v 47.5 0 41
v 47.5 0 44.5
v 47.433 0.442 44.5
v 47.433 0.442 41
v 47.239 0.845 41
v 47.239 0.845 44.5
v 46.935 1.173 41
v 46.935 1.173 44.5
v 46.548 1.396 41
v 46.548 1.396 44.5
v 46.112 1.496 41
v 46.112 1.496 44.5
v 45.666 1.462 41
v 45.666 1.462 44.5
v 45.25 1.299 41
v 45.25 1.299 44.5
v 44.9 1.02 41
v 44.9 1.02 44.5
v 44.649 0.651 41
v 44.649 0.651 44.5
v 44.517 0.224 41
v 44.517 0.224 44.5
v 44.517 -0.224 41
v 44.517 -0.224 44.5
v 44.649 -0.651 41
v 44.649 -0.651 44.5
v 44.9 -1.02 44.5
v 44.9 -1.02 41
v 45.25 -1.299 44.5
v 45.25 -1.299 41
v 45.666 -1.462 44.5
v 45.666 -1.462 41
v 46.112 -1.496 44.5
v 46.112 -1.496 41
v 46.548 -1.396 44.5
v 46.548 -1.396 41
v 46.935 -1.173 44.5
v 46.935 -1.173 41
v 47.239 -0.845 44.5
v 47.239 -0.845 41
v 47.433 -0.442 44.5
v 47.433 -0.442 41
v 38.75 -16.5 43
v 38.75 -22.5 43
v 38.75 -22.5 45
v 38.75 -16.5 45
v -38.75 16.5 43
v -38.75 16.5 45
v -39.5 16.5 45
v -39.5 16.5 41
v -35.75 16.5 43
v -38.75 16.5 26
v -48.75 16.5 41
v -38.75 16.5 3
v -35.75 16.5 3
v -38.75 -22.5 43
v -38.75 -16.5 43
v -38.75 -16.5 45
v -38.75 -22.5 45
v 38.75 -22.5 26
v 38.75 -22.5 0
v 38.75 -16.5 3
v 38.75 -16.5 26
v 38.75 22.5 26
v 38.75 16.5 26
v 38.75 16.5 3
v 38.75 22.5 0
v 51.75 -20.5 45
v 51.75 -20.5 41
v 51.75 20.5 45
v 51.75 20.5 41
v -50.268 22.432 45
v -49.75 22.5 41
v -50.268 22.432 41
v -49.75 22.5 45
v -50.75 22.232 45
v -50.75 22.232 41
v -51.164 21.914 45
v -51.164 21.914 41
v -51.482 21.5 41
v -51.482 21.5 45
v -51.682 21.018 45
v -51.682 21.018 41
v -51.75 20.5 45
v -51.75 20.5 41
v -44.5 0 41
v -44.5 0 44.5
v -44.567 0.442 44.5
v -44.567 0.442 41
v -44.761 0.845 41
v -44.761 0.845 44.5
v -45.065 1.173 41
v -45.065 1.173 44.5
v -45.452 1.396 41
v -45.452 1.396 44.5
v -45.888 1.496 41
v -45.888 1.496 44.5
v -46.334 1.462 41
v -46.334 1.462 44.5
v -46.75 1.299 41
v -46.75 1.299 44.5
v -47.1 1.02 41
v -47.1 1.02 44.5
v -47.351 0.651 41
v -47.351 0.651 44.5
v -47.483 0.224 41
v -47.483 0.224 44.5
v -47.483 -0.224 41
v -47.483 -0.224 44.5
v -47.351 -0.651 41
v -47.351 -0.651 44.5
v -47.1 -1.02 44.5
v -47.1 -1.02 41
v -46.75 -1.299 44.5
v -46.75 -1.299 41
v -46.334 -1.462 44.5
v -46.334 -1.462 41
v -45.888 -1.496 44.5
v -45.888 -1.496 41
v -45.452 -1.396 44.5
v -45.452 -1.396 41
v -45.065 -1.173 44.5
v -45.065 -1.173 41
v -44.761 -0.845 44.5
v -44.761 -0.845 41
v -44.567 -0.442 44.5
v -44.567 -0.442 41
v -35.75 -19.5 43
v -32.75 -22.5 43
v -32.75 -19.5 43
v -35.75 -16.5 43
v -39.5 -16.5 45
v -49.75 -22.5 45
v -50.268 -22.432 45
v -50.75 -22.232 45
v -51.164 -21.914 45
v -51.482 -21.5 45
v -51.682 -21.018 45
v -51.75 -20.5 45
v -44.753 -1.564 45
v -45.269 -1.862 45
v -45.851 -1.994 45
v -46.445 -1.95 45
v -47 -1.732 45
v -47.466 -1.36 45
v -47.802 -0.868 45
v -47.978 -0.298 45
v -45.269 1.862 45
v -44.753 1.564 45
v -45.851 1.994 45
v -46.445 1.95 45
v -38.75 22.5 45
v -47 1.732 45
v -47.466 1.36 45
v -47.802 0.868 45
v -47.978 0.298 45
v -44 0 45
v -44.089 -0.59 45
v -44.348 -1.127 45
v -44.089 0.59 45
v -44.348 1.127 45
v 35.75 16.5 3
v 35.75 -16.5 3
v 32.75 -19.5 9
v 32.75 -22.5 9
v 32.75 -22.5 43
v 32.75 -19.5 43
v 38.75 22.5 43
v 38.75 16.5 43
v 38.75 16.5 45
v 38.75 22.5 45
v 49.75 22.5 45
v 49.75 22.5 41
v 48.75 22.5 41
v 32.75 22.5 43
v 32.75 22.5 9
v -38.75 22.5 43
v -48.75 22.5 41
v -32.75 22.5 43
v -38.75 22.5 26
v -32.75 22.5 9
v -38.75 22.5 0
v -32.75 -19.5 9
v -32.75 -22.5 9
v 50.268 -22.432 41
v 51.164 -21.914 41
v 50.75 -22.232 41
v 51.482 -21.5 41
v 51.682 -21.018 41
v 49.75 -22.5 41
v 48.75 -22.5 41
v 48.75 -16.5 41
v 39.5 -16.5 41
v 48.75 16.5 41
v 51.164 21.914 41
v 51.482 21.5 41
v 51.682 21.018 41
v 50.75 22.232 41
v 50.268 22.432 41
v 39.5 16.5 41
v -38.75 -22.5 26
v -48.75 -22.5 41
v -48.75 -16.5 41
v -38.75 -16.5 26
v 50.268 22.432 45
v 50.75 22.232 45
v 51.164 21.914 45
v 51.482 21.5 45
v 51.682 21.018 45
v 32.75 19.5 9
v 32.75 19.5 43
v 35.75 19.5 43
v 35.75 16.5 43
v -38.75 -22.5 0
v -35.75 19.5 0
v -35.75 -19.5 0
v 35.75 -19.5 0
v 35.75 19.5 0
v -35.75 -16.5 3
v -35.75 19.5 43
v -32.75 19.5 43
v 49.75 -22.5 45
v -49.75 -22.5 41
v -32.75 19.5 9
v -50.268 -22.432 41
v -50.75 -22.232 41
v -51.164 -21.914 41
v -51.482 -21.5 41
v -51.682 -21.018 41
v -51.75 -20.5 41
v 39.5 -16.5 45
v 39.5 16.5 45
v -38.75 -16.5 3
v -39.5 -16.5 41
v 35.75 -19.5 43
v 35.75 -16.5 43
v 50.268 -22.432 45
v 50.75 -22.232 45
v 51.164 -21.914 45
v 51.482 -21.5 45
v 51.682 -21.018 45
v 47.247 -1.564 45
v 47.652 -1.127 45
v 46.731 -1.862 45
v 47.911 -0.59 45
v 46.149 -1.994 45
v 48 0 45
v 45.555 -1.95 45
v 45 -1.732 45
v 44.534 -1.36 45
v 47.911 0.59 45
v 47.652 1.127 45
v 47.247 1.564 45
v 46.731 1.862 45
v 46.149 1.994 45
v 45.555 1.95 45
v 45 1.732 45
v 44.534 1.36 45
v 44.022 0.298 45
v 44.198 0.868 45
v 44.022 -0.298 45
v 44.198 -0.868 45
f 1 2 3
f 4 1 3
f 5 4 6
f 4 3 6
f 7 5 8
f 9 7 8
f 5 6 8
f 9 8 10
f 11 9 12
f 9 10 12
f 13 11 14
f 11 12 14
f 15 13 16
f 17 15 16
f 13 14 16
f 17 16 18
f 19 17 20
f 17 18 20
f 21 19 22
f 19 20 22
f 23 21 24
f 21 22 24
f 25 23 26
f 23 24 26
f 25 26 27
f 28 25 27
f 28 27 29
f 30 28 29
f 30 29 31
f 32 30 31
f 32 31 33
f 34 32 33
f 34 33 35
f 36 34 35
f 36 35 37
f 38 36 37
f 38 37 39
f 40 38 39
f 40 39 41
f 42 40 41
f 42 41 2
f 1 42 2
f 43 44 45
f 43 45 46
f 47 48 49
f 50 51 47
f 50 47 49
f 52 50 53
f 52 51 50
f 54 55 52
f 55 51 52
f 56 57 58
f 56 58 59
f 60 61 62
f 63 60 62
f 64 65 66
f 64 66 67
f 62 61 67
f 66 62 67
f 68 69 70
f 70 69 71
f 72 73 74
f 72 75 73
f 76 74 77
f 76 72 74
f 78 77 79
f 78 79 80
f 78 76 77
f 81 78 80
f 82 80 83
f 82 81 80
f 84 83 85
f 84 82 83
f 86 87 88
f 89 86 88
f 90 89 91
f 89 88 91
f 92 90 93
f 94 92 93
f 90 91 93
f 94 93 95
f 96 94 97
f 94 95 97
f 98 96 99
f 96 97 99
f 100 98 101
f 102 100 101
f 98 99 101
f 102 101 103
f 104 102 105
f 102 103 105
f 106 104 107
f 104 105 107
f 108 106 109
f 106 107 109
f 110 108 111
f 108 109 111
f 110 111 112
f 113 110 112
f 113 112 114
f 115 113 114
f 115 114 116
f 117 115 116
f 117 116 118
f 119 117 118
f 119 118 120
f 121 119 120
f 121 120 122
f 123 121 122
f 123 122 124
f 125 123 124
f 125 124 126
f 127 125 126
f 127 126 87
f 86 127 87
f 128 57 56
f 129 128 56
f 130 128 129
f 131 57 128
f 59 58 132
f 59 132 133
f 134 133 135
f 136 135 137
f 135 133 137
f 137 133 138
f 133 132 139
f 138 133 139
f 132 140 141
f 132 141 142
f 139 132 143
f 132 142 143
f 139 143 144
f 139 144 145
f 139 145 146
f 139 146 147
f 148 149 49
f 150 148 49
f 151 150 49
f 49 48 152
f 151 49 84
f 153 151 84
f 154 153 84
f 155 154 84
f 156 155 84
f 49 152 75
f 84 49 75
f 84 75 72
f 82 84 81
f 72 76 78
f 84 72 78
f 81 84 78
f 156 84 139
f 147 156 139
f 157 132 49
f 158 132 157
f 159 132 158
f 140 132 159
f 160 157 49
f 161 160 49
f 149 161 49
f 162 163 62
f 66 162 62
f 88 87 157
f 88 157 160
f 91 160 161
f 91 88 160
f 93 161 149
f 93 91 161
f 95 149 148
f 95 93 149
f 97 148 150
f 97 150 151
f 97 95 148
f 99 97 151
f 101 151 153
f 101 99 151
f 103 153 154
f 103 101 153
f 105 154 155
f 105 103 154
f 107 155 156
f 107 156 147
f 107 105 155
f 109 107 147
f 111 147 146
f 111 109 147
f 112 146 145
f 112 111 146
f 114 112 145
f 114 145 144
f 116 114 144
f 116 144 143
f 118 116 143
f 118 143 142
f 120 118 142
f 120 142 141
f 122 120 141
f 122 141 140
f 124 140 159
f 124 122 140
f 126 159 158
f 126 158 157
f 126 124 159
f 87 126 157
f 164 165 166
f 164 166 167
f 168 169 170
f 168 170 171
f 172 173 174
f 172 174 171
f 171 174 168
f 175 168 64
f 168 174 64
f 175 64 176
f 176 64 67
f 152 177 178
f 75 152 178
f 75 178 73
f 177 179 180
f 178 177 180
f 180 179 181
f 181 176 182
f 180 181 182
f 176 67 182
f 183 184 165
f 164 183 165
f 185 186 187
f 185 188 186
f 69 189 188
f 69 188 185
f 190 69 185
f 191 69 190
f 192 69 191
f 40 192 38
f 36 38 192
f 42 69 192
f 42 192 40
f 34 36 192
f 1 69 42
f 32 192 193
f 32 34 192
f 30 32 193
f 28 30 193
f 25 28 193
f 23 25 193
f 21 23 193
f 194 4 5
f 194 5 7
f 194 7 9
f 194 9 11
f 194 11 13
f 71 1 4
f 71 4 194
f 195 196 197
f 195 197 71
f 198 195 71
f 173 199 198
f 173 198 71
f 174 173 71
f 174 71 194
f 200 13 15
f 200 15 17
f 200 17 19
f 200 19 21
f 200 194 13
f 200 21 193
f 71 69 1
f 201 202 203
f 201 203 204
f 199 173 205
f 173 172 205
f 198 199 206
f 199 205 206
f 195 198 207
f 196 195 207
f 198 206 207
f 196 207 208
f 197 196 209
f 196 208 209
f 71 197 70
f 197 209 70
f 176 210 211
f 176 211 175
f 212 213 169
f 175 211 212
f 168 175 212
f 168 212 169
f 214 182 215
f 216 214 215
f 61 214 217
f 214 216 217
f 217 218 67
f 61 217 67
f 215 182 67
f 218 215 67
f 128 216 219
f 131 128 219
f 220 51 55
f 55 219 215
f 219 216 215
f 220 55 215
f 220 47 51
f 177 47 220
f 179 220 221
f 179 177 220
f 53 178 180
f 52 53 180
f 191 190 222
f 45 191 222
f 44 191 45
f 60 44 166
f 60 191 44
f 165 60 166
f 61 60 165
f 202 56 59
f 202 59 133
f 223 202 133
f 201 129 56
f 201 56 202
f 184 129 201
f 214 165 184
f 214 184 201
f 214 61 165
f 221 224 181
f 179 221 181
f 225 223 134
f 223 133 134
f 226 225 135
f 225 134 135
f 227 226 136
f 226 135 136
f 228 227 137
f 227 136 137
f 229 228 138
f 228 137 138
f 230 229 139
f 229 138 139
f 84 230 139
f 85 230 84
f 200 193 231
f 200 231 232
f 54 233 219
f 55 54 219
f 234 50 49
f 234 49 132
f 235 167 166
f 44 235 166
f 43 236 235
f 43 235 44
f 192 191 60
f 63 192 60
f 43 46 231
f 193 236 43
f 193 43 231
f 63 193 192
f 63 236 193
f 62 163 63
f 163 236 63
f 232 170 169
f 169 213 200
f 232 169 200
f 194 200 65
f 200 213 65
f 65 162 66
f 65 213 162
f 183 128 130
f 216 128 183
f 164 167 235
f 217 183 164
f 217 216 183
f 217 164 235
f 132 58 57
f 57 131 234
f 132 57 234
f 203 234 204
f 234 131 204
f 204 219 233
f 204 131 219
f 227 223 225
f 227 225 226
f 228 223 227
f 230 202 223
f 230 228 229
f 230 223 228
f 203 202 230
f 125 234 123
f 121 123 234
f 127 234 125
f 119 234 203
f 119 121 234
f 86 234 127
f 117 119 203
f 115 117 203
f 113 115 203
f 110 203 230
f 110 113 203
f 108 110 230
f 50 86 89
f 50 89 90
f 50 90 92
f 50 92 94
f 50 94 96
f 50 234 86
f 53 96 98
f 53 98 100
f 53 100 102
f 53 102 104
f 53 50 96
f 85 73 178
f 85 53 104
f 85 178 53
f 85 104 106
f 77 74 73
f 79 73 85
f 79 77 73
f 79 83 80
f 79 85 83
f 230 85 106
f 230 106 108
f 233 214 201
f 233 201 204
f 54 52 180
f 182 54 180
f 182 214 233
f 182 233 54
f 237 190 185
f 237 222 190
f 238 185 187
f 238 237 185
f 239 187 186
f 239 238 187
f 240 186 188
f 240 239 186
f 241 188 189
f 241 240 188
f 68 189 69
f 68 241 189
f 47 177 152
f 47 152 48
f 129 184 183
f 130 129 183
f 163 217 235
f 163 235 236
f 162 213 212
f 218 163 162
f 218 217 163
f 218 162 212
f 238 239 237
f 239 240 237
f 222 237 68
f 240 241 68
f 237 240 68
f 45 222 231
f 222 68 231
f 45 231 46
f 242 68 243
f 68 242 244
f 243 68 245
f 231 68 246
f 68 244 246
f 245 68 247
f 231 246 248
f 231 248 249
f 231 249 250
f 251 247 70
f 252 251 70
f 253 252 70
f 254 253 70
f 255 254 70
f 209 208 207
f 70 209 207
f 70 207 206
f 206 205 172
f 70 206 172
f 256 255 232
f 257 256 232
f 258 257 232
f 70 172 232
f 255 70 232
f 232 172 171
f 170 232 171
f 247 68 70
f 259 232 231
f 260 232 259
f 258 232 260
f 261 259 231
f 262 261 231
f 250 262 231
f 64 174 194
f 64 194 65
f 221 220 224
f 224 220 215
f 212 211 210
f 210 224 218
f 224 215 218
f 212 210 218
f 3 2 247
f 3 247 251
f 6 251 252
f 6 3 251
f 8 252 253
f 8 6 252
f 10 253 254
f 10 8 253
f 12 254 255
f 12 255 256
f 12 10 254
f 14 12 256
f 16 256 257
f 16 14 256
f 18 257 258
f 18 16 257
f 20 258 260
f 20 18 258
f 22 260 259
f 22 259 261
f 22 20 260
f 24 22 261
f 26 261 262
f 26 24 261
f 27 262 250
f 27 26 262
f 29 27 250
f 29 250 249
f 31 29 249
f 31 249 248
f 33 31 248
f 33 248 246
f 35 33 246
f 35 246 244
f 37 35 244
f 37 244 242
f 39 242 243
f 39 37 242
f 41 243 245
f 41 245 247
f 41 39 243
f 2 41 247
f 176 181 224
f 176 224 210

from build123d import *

# Parameters (mm, degrees)
SKETCH_1_W             = 77.5
SKETCH_1_H             = 45
SKETCH_1_W_2           = 71.5
SKETCH_1_H_2           = 39
EXTRUDE_1_DEPTH        = 3
SKETCH_2_W             = 3
SKETCH_2_H             = 3
EXTRUDE_2_DEPTH        = 40
SKETCH_3_W             = 3
SKETCH_3_H             = 3
EXTRUDE_3_DEPTH        = 40
EXTRUDE_4_DEPTH        = 2
EXTRUDE_4_DEPTH_BACK   = 2
EXTRUDE_4_2_DEPTH      = 2
EXTRUDE_4_2_DEPTH_BACK = 2
SKETCH_5_W             = 65.5
SKETCH_5_H             = 6
EXTRUDE_5_DEPTH        = 3
SKETCH_6_W             = 65.5
SKETCH_6_H             = 6
EXTRUDE_6_DEPTH        = 3
SKETCH_7_R             = 1.5
CUT_EXTRUDE_1_DEPTH    = 5
CHAMFER_1_SIZE         = 0.5
CHAMFER_2_SIZE         = 0.5
CHAMFER_3_SIZE         = 2
CHAMFER_4_SIZE         = 2
EXTRUDE_7_DEPTH        = 6
MIRROR_2_COPY_1_DEPTH  = 6
MIRROR_2_COPY_2_DEPTH  = 6
SKETCH_9_W             = 2
SKETCH_9_H             = 45
CUT_EXTRUDE_2_DEPTH    = 10
FILLET_1_R             = 2


with BuildPart() as part:
    # 草图1 → 凸台-拉伸1 (new body)
    with BuildSketch(Plane.XY):
        Rectangle(SKETCH_1_W, SKETCH_1_H)
        Rectangle(SKETCH_1_W_2, SKETCH_1_H_2, mode=Mode.SUBTRACT)
    extrude(amount=EXTRUDE_1_DEPTH)

    # 草图2 → 凸台-拉伸2 (add)
    with BuildSketch(Plane.XY.offset(3)):
        with Locations((37.25, 21)):
            Rectangle(SKETCH_2_W, SKETCH_2_H)
        with Locations((-37.25, 21)):
            Rectangle(SKETCH_2_W, SKETCH_2_H)
        with Locations((-37.25, -21)):
            Rectangle(SKETCH_2_W, SKETCH_2_H)
        with Locations((37.25, -21)):
            Rectangle(SKETCH_2_W, SKETCH_2_H)
    extrude(amount=EXTRUDE_2_DEPTH)

    # 草图3 → 凸台-拉伸3 (add)
    with BuildSketch(Plane.XY.offset(3)):
        with Locations((34.25, -21)):
            Rectangle(SKETCH_3_W, SKETCH_3_H)
        with Locations((37.25, 18)):
            Rectangle(SKETCH_3_W, SKETCH_3_H)
        with Locations((34.25, 21)):
            Rectangle(SKETCH_3_W, SKETCH_3_H)
        with Locations((37.25, -18)):
            Rectangle(SKETCH_3_W, SKETCH_3_H)
        with Locations((-34.25, 21)):
            Rectangle(SKETCH_3_W, SKETCH_3_H)
        with Locations((-37.25, 18)):
            Rectangle(SKETCH_3_W, SKETCH_3_H)
        with Locations((-37.25, -18)):
            Rectangle(SKETCH_3_W, SKETCH_3_H)
        with Locations((-34.25, -21)):
            Rectangle(SKETCH_3_W, SKETCH_3_H)
    extrude(amount=EXTRUDE_3_DEPTH)

    # 草图5 → 凸台-拉伸5 (add)
    with BuildSketch(Plane(origin=(0, 22.5, 0), x_dir=(1, 0, 0), z_dir=(0, 1, 0))):
        with Locations((0, -6)):
            Rectangle(SKETCH_5_W, SKETCH_5_H)
    extrude(amount=-EXTRUDE_5_DEPTH)


with BuildPart() as body_2:
    # 草图4 → 凸台-拉伸4 (new, two sides: drawn at the far end of the back side and taken through both)
    with BuildSketch(Plane.XY.offset(43).offset(-EXTRUDE_4_DEPTH_BACK)):
        Polygon((38.75, 22.5), (53.75, 22.5), (53.75, -22.5), (38.75, -22.5), (38.75, -16.5), (39.5, -16.5), (39.5, 16.5), (38.75, 16.5), align=None)
    extrude(amount=EXTRUDE_4_DEPTH + EXTRUDE_4_DEPTH_BACK)


with BuildPart() as body_3:
    # 草图4 → Extrude 4 2 (new, two sides: drawn at the far end of the back side and taken through both)
    with BuildSketch(Plane.XY.offset(43).offset(-EXTRUDE_4_2_DEPTH_BACK)):
        Polygon((-38.75, -16.5), (-38.75, -22.5), (-53.75, -22.5), (-53.75, 22.5), (-38.75, 22.5), (-38.75, 16.5), (-39.5, 16.5), (-39.5, -16.5), align=None)
    extrude(amount=EXTRUDE_4_2_DEPTH + EXTRUDE_4_2_DEPTH_BACK)


with BuildPart() as body_4:
    # 草图6 → 凸台-拉伸6 (new body)
    with BuildSketch(Plane.XZ.offset(22.5)):
        with Locations((0, 6)):
            Rectangle(SKETCH_6_W, SKETCH_6_H)
    extrude(amount=-EXTRUDE_6_DEPTH)


with BuildPart() as cut_extrude_1_tool:
    # 草图7 → 切除-拉伸1 (new body)
    with BuildSketch(Plane.XY.offset(45)):
        with Locations((-46, 0)):
            Circle(SKETCH_7_R)
        with Locations((46, 0)):
            Circle(SKETCH_7_R)
    extrude(amount=-CUT_EXTRUDE_1_DEPTH)


with BuildPart() as body_2_1:
    add(body_2.part)

    # 切除-拉伸1: cut by cut_extrude_1_tool
    add(cut_extrude_1_tool.part, mode=Mode.SUBTRACT)

    # 倒角2
    chamfer_2_edges = [body_2_1.edges().sort_by_distance(p)[0] for p in [
        (44.5, 0, 45),
    ]]
    chamfer(chamfer_2_edges, length=CHAMFER_2_SIZE)

    # 倒角3
    chamfer_3_edges = [body_2_1.edges().sort_by_distance(p)[0] for p in [
        (53.75, -22.5, 43),
        (53.75, 22.5, 43),
    ]]
    chamfer(chamfer_3_edges, length=CHAMFER_3_SIZE)


with BuildPart() as body_3_1:
    add(body_3.part)

    # 切除-拉伸1: cut by cut_extrude_1_tool
    add(cut_extrude_1_tool.part, mode=Mode.SUBTRACT)

    # 倒角1
    chamfer_1_edges = [body_3_1.edges().sort_by_distance(p)[0] for p in [
        (-47.5, 0, 45),
    ]]
    chamfer(chamfer_1_edges, length=CHAMFER_1_SIZE)


with BuildPart() as part_1:
    add(part.part)

    # Combine 1: union body 3
    add(body_3_1.part)


with BuildPart() as body_4_1:
    add(body_4.part)

    # Combine 2: union part
    add(part_1.part)


with BuildPart() as body_2_2:
    add(body_2_1.part)

    # Combine 3: union body 4
    add(body_4_1.part)

    # 倒角4
    chamfer_4_edges = [body_2_2.edges().sort_by_distance(p)[0] for p in [
        (-53.75, -22.5, 43),
        (-53.75, 22.5, 43),
    ]]
    chamfer(chamfer_4_edges, length=CHAMFER_4_SIZE)

    # 草图8 → 凸台-拉伸7 (add)
    with BuildSketch(Plane(origin=(0, 22.5, 0), x_dir=(1, 0, 0), z_dir=(0, 1, 0))):
        Polygon((48.75, -41), (38.75, -26), (38.75, -41), align=None)
    extrude_7 = extrude(amount=-EXTRUDE_7_DEPTH)

    # 镜向1: 凸台-拉伸7 across plane
    add(extrude_7.mirror(Plane(origin=(0, 0, 0), x_dir=(0, 0, 1), z_dir=(1, 0, 0))))

    # 镜向2 copy 1 sketch → 镜向2 copy 1 (add)
    with BuildSketch(Plane(origin=(0, -22.5, 0), x_dir=(-1, 0, 0), z_dir=(0, -1, 0))):
        Polygon((48.75, -41), (38.75, -26), (38.75, -41), align=None)
    extrude(amount=-MIRROR_2_COPY_1_DEPTH)

    # 镜向2 copy 2 sketch → 镜向2 copy 2 (add)
    with BuildSketch(Plane.XZ.offset(22.5)):
        Polygon((48.75, 41), (38.75, 26), (38.75, 41), align=None)
    extrude(amount=-MIRROR_2_COPY_2_DEPTH)

    # 草图9 → 切除-拉伸2 (cut)
    with BuildSketch(Plane(origin=(0, 0, 41), x_dir=(-1, 0, 0), z_dir=(0, 0, -1))):
        with Locations((52.75, 0)):
            Rectangle(SKETCH_9_W, SKETCH_9_H)
        with Locations((-52.75, 0)):
            Rectangle(SKETCH_9_W, SKETCH_9_H)
    extrude(amount=-CUT_EXTRUDE_2_DEPTH, mode=Mode.SUBTRACT)

    # 圆角1
    fillet_1_edges = [body_2_2.edges().sort_by_distance(p)[0] for p in [
        (-51.75, 22.5, 43),
        (-51.75, -22.5, 43),
        (51.75, -22.5, 43),
        (51.75, 22.5, 43),
    ]]
    fillet(fillet_1_edges, radius=FILLET_1_R)


solid = body_2_2.part
